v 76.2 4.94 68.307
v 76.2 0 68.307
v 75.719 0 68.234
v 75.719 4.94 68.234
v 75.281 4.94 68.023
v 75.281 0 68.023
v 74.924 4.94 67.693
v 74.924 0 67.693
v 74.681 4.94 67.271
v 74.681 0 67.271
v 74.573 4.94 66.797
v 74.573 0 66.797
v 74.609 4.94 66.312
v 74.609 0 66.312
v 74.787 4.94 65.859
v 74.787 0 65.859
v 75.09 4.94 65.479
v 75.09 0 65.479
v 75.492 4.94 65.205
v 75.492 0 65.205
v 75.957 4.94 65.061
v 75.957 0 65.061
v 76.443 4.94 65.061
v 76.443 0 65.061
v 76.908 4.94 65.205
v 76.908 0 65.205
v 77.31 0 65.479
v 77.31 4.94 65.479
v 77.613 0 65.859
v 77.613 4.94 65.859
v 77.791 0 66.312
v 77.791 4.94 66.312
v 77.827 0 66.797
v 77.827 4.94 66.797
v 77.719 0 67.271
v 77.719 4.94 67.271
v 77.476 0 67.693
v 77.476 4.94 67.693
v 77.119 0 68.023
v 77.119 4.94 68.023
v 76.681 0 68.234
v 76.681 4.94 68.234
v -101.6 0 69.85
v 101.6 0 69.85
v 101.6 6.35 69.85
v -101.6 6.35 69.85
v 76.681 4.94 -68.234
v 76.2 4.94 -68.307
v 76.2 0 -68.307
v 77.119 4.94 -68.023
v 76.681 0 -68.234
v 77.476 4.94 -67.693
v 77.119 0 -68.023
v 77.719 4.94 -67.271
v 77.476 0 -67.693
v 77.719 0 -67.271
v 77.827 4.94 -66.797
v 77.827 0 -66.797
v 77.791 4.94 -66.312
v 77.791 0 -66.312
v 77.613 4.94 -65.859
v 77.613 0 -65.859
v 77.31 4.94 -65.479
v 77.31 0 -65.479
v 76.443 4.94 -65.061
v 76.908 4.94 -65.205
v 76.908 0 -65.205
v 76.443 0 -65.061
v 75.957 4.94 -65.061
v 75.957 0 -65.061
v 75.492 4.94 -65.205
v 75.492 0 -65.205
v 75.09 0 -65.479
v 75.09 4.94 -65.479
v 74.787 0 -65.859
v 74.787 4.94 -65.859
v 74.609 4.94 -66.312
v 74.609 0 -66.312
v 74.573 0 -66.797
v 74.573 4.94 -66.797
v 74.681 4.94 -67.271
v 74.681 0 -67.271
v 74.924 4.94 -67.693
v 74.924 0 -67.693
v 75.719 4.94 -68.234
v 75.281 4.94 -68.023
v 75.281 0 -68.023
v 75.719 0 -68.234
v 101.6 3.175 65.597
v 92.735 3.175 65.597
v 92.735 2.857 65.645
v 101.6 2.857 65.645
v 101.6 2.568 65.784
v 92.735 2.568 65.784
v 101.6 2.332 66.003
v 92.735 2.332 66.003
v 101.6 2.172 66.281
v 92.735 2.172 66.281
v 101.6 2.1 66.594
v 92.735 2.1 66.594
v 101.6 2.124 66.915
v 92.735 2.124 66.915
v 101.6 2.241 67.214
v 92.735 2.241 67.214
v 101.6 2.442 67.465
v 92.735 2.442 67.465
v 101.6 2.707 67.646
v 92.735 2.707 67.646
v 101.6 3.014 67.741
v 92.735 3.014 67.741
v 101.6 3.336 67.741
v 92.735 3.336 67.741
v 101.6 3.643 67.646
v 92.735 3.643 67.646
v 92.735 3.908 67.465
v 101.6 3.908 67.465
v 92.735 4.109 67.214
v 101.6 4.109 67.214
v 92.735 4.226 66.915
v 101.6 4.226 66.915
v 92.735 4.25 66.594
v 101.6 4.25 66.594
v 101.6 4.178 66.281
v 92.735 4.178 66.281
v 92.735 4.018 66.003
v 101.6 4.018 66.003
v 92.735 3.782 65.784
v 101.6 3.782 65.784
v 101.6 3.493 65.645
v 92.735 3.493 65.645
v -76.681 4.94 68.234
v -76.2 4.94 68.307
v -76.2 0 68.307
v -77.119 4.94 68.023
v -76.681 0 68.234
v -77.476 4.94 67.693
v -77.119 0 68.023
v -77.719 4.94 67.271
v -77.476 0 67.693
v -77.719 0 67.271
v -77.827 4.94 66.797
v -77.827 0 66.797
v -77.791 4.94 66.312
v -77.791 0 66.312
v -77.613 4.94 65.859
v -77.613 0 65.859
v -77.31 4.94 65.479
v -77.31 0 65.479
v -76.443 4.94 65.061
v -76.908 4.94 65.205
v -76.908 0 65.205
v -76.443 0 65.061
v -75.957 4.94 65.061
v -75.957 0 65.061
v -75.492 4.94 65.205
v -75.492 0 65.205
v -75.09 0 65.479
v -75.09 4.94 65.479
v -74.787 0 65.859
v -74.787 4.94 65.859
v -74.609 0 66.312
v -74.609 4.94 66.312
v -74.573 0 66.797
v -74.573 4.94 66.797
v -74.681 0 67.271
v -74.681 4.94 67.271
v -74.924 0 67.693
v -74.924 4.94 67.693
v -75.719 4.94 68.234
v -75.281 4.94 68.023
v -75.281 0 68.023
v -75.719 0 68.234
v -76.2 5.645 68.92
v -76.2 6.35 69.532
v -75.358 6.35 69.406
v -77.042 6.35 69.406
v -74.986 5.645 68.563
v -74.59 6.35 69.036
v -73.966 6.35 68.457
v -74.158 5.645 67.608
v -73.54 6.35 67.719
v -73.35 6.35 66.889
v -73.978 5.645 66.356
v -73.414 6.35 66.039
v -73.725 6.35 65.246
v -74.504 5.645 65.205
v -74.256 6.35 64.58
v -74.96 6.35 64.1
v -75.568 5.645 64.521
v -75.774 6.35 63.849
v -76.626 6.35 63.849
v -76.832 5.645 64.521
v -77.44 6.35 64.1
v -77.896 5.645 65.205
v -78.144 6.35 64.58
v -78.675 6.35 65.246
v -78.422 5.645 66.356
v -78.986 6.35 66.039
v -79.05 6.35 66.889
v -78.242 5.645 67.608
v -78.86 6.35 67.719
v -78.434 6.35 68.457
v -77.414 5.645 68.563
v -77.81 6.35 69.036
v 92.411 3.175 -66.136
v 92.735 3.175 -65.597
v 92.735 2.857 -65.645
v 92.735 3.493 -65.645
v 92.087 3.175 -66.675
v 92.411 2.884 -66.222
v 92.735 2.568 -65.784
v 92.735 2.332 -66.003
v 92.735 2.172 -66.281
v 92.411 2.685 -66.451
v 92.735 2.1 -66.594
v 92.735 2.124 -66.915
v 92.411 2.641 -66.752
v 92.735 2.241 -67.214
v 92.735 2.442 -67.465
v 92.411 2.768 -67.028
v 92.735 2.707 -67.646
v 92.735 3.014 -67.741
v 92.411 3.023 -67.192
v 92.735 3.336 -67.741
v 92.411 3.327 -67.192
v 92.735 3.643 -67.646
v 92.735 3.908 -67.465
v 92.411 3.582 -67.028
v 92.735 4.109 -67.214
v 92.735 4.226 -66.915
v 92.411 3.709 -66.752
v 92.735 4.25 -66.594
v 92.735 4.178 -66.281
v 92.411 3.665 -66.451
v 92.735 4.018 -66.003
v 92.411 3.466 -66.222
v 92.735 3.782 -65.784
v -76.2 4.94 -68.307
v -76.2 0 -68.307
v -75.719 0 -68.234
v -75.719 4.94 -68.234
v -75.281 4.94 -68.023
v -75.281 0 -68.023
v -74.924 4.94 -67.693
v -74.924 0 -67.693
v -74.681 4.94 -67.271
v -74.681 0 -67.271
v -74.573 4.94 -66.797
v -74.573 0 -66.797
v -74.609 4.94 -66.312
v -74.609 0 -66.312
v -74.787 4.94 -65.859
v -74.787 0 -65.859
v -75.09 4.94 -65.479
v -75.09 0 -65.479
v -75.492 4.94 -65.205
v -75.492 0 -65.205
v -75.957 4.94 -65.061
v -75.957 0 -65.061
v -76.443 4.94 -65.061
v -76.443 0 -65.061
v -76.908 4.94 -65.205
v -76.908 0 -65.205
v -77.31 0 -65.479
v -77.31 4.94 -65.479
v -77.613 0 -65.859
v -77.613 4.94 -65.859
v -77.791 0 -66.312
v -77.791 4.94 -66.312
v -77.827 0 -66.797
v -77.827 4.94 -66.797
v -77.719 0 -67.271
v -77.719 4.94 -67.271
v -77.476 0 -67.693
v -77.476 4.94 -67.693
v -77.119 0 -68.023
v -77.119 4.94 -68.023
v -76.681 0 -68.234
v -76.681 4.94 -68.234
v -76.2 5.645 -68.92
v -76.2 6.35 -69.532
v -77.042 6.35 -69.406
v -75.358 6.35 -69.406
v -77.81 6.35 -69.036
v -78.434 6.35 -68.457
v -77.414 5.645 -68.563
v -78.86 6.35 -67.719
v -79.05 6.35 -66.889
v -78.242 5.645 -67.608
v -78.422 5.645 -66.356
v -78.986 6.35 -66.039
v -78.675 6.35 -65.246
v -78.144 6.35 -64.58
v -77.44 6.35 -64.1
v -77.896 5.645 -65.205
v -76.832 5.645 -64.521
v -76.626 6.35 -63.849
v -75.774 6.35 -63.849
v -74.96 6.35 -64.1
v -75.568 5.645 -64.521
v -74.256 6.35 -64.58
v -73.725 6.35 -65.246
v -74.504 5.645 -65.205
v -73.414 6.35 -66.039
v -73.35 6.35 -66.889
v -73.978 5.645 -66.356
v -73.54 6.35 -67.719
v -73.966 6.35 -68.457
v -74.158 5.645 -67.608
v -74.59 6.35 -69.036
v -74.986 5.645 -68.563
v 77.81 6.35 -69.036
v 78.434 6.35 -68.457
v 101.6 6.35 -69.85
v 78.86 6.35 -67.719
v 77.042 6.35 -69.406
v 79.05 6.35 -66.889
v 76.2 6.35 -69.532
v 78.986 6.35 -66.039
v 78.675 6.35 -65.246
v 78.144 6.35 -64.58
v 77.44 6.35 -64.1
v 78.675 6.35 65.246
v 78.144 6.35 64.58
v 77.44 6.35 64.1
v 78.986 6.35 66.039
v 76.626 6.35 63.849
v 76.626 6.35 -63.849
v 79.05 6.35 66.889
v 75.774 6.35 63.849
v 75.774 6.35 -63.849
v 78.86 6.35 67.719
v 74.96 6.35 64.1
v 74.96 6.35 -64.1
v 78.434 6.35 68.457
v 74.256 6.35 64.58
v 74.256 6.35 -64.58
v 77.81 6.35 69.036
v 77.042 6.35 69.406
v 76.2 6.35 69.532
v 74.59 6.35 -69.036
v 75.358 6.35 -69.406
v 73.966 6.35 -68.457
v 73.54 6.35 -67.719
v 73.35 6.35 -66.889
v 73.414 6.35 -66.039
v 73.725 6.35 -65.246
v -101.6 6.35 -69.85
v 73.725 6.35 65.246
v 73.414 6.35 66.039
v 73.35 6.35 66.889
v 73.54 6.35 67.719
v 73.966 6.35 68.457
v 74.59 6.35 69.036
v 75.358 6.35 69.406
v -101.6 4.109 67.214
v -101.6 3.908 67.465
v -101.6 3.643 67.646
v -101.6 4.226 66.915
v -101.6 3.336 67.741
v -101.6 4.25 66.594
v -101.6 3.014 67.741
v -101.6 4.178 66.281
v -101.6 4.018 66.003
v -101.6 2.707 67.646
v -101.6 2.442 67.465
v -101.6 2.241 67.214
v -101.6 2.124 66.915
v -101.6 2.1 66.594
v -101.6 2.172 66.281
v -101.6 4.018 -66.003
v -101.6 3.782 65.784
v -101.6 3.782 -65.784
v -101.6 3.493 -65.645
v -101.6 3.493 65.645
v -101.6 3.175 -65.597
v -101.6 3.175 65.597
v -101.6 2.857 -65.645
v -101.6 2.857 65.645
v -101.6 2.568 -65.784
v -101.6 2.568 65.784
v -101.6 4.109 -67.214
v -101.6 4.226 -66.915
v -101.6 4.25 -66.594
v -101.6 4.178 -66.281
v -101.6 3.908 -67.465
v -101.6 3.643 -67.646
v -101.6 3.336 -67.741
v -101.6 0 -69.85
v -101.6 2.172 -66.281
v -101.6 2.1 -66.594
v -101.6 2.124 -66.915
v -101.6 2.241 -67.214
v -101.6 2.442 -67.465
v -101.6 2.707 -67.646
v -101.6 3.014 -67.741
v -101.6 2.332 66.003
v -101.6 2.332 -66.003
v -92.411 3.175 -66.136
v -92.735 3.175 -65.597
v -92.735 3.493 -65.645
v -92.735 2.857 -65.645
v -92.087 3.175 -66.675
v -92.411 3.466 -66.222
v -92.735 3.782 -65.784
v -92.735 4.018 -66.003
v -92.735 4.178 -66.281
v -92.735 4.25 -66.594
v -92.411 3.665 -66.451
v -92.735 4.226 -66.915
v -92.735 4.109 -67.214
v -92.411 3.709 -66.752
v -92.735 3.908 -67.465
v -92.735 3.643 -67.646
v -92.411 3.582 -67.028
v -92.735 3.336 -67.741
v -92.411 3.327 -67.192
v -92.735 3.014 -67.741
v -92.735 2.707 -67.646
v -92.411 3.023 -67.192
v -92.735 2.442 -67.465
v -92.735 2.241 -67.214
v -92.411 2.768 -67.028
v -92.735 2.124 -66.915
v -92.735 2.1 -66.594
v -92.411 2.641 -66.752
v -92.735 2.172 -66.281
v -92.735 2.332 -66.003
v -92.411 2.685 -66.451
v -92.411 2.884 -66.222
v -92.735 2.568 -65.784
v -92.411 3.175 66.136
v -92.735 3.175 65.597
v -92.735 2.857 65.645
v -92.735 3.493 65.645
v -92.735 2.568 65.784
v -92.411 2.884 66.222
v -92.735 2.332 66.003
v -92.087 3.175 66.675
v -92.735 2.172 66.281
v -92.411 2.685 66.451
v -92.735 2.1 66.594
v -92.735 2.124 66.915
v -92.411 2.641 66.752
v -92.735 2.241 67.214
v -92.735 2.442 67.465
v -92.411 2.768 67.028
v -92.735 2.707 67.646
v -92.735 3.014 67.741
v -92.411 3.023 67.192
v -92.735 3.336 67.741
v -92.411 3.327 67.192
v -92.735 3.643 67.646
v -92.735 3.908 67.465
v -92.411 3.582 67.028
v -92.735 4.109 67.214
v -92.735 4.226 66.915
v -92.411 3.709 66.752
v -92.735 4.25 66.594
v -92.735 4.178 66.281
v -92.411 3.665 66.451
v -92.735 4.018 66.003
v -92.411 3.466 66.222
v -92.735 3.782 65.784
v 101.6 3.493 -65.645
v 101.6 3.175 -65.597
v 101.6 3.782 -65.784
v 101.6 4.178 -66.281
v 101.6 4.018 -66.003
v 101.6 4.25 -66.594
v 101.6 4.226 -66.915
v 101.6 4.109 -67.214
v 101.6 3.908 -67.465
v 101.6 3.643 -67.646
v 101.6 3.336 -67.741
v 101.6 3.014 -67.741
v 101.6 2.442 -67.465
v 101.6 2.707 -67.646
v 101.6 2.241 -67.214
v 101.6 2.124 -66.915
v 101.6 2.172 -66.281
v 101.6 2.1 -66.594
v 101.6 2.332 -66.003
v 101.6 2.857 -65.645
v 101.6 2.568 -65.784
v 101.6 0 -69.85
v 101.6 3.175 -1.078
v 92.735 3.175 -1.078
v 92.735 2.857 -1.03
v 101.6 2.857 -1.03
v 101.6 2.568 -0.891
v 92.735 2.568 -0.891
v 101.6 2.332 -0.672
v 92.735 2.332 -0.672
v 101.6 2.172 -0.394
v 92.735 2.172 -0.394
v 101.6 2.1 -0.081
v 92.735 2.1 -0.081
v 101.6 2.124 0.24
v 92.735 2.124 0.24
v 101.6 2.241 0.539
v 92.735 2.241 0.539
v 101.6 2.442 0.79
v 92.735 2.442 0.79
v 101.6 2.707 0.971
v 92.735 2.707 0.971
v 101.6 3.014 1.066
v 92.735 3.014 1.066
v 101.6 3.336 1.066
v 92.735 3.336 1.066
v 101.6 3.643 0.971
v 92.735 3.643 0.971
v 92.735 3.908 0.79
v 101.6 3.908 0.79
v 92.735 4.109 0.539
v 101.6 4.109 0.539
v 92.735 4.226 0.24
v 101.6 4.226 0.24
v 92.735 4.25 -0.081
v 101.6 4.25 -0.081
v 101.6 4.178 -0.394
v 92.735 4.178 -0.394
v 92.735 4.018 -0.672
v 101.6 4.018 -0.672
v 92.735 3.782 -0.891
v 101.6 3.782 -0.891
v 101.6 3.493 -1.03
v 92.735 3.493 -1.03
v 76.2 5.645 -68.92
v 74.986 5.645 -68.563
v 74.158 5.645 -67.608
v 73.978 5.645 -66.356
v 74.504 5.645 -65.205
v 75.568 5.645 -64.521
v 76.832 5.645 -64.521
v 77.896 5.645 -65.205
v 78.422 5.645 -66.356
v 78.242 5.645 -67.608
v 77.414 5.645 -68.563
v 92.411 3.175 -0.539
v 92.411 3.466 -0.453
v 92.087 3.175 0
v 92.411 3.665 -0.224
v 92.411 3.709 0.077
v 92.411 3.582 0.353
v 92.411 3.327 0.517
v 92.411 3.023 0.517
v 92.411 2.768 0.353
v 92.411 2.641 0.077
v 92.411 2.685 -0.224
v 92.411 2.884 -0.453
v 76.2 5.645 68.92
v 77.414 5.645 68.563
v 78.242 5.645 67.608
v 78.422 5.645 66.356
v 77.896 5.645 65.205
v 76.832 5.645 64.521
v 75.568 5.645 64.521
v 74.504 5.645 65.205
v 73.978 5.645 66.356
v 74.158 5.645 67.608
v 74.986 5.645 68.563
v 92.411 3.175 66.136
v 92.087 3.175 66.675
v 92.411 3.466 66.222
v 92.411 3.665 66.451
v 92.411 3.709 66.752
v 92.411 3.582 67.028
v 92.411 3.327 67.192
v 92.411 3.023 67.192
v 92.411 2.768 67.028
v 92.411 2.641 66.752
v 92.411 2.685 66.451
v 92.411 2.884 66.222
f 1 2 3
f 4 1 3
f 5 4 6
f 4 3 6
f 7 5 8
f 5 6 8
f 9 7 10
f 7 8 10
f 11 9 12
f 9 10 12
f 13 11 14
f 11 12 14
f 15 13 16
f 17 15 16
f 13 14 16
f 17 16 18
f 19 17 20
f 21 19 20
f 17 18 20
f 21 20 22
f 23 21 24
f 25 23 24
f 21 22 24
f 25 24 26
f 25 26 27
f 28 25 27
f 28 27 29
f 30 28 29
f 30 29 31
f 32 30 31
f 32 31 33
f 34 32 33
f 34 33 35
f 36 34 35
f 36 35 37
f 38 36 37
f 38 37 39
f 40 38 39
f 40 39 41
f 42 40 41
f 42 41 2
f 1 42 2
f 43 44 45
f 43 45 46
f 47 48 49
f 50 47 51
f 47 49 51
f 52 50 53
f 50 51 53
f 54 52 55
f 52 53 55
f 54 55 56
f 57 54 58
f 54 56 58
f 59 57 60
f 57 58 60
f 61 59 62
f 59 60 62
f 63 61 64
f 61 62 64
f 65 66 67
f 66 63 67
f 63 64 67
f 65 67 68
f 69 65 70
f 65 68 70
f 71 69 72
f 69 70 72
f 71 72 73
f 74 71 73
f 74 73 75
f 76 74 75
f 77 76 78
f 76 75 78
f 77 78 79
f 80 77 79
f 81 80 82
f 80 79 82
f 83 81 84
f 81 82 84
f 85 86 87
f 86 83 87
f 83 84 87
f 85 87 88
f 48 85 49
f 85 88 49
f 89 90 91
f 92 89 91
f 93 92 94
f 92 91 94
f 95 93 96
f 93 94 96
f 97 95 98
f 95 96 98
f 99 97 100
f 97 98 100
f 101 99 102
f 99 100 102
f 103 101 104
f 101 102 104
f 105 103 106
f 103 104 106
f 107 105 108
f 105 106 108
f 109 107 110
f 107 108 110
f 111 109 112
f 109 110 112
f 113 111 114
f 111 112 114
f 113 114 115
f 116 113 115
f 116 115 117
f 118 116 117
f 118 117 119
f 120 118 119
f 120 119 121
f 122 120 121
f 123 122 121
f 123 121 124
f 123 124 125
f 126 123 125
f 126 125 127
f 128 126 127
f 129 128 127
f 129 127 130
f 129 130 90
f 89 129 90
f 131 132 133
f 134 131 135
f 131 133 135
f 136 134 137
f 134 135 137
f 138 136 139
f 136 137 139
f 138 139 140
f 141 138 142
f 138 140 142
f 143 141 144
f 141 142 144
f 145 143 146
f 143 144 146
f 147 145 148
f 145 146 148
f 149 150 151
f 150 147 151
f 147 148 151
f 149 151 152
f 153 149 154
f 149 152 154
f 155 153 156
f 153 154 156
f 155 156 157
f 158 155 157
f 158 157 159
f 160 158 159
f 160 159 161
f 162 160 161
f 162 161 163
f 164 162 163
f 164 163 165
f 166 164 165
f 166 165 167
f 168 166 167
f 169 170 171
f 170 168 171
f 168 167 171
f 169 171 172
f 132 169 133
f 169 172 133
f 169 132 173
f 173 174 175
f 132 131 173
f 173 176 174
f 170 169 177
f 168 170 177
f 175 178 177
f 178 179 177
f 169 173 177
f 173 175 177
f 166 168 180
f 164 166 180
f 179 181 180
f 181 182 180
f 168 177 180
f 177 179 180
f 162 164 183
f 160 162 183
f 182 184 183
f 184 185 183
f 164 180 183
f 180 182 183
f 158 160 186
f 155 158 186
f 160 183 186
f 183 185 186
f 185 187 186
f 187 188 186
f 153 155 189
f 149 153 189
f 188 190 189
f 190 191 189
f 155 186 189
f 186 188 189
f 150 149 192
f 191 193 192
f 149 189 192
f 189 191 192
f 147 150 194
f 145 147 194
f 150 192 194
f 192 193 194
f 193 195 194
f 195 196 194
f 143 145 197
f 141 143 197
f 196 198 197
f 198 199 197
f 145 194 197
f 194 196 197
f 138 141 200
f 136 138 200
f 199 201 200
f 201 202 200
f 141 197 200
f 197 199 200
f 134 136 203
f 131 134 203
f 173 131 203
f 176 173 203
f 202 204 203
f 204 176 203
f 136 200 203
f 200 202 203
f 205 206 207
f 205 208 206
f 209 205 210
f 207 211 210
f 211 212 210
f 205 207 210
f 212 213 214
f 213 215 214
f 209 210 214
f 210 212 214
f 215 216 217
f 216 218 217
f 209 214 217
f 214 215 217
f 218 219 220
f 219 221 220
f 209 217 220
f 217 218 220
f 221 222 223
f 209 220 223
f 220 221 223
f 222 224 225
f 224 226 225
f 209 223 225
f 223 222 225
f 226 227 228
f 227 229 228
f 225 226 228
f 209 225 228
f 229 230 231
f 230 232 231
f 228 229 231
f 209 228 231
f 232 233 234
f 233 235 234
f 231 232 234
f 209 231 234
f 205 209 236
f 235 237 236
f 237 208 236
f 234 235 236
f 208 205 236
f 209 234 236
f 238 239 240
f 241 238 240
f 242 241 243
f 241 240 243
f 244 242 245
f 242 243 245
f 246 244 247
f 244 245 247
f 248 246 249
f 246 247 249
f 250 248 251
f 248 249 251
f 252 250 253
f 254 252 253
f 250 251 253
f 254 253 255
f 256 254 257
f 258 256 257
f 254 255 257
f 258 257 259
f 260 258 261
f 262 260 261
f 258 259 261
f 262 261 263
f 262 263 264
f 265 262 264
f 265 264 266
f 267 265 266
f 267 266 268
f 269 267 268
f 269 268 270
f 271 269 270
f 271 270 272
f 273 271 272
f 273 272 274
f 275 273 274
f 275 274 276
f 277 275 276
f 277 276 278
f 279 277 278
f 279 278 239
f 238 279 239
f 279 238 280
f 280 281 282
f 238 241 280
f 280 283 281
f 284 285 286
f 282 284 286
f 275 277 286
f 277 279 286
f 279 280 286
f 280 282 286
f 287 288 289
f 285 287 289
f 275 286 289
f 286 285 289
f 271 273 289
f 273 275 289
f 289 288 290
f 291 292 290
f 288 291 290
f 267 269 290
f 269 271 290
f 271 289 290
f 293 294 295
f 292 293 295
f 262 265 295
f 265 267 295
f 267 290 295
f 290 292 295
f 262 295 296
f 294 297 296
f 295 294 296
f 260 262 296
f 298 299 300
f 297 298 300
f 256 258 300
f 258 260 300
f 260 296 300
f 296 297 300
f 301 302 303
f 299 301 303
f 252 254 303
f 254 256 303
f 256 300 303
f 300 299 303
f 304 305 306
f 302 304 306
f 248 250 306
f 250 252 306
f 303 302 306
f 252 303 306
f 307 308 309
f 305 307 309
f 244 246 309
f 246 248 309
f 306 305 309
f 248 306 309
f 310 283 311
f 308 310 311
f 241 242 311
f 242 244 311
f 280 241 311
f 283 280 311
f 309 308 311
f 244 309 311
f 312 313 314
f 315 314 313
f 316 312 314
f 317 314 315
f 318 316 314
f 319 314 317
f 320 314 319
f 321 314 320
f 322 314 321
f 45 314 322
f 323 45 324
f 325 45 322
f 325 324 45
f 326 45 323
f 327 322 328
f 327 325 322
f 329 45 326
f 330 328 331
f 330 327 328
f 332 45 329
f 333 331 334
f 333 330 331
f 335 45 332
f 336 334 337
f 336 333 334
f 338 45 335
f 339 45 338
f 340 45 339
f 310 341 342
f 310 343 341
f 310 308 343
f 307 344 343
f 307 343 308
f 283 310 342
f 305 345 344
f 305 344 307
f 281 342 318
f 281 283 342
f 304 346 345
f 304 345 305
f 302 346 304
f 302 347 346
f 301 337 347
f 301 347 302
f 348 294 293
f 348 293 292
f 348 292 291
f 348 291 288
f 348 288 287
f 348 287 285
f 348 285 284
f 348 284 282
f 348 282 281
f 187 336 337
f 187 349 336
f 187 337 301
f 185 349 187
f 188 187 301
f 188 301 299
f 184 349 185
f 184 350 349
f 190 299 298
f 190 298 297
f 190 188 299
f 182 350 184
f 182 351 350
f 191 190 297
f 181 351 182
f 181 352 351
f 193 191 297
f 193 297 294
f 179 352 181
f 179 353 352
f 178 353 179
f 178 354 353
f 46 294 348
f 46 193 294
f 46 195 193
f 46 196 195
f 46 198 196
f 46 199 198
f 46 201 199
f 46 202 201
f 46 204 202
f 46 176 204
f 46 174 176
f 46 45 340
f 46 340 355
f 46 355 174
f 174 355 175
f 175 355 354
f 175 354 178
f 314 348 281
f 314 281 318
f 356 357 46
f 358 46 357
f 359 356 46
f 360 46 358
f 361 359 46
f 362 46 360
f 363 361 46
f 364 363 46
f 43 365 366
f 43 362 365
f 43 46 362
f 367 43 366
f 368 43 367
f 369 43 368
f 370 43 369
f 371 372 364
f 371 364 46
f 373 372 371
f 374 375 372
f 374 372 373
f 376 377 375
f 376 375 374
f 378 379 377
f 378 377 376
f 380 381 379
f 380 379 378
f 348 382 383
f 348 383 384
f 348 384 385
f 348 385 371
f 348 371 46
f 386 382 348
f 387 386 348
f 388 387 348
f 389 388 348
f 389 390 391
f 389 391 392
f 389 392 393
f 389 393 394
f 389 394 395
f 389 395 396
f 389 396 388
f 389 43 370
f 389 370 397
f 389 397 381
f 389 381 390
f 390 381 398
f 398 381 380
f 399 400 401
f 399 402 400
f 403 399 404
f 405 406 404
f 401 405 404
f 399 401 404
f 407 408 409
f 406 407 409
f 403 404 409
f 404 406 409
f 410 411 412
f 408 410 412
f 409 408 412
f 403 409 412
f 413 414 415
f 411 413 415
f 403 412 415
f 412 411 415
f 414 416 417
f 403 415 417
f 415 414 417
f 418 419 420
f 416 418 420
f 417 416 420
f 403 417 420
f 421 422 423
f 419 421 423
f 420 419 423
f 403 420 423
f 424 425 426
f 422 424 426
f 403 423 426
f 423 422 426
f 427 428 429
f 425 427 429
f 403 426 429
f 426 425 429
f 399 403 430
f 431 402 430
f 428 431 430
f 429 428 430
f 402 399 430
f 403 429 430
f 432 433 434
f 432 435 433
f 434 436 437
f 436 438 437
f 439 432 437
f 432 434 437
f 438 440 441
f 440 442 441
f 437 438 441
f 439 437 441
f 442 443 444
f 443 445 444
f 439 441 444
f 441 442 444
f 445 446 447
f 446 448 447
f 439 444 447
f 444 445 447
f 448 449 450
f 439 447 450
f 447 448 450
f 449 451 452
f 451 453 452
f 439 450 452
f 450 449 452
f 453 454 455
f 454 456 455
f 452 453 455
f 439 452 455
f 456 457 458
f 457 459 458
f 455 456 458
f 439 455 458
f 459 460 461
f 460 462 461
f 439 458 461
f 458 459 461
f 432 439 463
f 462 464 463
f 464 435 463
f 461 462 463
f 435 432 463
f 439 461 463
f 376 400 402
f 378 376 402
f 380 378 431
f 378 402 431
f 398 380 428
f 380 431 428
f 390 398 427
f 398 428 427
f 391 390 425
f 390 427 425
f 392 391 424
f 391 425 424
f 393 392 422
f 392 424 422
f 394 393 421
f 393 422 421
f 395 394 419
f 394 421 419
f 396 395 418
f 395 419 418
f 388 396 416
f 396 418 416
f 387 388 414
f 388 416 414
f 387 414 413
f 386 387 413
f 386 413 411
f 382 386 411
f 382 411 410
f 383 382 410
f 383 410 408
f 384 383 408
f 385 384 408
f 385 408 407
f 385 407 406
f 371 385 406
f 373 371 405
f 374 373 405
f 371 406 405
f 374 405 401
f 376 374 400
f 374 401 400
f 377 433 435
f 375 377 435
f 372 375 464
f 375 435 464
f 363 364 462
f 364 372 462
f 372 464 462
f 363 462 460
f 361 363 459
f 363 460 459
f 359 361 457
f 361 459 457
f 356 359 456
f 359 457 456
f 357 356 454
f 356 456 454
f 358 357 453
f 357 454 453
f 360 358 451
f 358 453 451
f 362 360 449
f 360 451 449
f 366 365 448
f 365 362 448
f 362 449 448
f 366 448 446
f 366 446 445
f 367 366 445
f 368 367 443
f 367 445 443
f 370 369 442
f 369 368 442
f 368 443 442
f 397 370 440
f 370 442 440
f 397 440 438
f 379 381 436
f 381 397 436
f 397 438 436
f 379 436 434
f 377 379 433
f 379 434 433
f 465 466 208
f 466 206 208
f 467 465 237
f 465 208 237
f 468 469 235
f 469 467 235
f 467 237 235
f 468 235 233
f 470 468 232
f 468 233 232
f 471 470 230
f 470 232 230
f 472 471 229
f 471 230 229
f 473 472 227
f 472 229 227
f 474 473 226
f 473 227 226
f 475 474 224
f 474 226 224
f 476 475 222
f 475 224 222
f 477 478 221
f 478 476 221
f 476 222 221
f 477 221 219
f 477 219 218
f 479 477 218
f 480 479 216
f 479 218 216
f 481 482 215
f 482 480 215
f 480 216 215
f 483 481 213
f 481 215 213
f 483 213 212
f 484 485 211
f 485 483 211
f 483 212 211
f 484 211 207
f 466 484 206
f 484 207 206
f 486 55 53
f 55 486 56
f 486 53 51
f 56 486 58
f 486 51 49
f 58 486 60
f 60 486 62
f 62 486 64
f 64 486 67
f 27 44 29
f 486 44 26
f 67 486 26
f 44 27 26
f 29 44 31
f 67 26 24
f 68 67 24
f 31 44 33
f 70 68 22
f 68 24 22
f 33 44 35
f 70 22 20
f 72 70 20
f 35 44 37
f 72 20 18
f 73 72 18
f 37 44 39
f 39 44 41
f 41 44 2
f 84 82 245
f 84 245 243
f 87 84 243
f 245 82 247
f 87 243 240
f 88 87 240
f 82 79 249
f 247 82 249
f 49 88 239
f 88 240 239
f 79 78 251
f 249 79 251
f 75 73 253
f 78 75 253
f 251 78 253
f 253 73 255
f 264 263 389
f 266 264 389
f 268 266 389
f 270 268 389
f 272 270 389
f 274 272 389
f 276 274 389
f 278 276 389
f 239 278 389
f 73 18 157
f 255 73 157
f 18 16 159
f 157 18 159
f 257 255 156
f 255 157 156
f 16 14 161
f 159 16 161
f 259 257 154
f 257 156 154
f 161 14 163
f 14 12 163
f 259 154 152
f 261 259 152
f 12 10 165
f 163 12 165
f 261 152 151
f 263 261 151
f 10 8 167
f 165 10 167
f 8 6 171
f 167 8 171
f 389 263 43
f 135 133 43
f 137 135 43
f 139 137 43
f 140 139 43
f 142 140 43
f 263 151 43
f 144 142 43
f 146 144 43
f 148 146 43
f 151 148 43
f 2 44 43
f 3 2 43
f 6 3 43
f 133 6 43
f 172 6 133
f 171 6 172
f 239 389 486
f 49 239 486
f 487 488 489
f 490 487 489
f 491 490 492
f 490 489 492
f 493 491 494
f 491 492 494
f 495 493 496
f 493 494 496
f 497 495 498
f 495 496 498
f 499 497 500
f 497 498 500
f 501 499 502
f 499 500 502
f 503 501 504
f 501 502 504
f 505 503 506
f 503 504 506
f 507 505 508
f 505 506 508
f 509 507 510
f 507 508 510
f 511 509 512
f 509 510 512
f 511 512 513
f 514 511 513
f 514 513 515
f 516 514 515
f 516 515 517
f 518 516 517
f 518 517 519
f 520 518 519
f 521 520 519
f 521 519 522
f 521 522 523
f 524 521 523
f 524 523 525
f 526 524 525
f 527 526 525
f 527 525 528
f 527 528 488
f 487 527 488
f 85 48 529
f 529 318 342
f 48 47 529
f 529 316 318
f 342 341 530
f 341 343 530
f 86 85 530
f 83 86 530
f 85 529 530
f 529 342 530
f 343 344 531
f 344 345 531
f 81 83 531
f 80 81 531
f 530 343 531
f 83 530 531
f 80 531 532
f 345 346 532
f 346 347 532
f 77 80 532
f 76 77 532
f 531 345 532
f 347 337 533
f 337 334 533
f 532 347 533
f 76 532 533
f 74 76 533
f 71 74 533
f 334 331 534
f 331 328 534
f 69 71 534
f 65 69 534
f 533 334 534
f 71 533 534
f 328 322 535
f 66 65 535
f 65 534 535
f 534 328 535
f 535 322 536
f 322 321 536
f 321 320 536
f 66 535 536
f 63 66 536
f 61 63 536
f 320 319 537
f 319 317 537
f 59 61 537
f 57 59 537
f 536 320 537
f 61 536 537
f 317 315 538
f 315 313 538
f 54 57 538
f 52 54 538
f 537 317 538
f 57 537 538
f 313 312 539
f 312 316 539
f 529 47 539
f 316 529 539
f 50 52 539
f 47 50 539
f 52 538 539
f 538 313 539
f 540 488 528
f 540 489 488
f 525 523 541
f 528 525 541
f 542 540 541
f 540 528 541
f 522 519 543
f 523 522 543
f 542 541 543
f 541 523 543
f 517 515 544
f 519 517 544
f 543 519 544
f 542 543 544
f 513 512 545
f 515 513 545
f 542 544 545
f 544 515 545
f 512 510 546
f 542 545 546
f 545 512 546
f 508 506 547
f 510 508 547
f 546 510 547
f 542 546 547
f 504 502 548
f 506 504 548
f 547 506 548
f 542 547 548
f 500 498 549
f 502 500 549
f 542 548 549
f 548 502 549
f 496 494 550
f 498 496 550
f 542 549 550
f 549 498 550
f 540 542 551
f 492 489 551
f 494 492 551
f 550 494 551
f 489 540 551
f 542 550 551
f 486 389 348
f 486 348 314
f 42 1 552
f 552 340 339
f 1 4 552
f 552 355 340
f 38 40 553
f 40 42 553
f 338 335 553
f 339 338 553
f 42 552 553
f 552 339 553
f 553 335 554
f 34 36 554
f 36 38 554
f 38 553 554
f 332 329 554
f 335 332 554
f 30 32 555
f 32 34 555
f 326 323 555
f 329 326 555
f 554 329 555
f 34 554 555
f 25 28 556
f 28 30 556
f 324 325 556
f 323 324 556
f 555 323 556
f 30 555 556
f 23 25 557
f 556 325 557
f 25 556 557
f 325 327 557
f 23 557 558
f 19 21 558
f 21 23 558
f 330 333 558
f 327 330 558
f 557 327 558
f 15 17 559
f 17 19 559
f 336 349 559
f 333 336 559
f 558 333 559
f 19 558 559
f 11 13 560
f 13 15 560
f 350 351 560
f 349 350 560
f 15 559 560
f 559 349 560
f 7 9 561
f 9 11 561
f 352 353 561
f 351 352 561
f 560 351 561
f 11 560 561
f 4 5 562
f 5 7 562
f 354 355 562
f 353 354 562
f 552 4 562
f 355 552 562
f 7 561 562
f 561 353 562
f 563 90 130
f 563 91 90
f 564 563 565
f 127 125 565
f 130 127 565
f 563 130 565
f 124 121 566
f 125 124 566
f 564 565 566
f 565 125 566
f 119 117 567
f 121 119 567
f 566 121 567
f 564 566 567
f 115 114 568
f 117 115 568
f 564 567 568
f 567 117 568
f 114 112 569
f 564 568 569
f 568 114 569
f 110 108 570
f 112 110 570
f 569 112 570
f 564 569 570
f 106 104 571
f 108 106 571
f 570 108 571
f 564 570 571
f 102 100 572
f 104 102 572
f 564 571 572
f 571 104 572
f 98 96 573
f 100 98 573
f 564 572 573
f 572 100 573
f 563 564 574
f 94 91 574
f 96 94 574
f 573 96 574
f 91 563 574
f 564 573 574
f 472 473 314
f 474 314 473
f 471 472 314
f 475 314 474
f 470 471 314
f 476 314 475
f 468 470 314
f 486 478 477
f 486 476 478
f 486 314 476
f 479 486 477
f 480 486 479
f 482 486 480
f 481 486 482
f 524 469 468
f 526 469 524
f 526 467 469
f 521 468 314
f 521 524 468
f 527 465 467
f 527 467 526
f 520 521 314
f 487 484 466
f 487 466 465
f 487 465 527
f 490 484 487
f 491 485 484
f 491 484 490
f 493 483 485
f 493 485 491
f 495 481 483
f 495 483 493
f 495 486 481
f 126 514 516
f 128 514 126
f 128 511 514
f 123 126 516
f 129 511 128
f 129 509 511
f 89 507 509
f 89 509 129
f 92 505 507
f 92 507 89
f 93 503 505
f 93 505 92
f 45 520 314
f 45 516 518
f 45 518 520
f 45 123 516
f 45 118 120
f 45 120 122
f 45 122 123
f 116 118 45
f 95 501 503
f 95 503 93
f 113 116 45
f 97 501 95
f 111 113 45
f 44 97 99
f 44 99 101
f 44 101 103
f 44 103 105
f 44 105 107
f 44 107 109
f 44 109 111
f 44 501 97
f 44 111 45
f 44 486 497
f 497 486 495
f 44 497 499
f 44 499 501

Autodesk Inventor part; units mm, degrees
ref_plane "YZ Plane" through (0, 0, 0) normal (1, 0, 0) x (0, 1, 0)
ref_plane "XZ Plane" through (0, 0, 0) normal (0, 1, 0) x (-1, 0, 0)
ref_plane "XY Plane" through (0, 0, 0) normal (0, 0, 1) x (1, 0, 0)
sketch "Sketch1" plane through (0, 0, 0) normal (0, 1, 0) x (-1, 0, 0)
  line L0 (-101.6, 69.85) -> (101.6, 69.85)
  line L1 (101.6, 69.85) -> (101.6, -69.85)
  line L2 (101.6, -69.85) -> (-101.6, -69.85)
  line L3 (-101.6, -69.85) -> (-101.6, 69.85)
  line L4 (-101.6, 69.85) -> (101.6, -69.85) construction
  line L5 (101.6, 69.85) -> (-101.6, -69.85) construction
  point P0 (0, 0)
  dimension "d0" = 203.2
  dimension "d1" = 139.7
extrude "Extrusion1" add sketch "Sketch1" along normal blind 6.35
sketch "Sketch9" plane through (101.6, 0, 69.85) normal (1, 0, 0) x (0, 0, -1)
  line L0 (139.7, 0) -> (0, 0) projected
  line L1 (139.7, 0) -> (139.7, 6.35) projected
  line L2 (0, 6.35) -> (139.7, 6.35) projected
  line L3 (0, 0) -> (0, 6.35) projected
  point P0 (69.85, 0)
  point P1 (3.175, 3.175)
  dimension "d45" = 3.175
  dimension "d46" = 3.175
hole "Hole3" at (101.6, 3.175, 66.675) direction (-1, 0, 0) diameter 2.156 depth 8.865 tip angle 118 thread size "4-40 UNC" class "2B" standard "ANSI Unified Screw Threads"
mirror "Mirror5" about plane through (0, 0, 0) normal (0, 0, 1) of "Hole3"
mirror "Mirror6" about plane through (0, 0, 0) normal (1, 0, 0) of "Hole3", "Mirror5"
sketch "Sketch11" plane through (0, 6.35, 0) normal (0, 1, 0) x (1, 0, 0)
  line L0 (-101.6, -69.85) -> (101.6, -69.85) projected
  line L1 (101.6, -69.85) -> (101.6, 69.85) projected
  line L2 (101.6, 69.85) -> (-101.6, 69.85) projected
  line L3 (-101.6, 69.85) -> (-101.6, -69.85) projected
  point P0 (0, 0)
  point P1 (76.2, -66.675)
  dimension "d61" = 25.4
  dimension "d62" = 3.175
hole "Hole4" at (76.2, 6.35, 66.675) direction (0, -1, 0) diameter 3.264 end through all countersink diameter 5.715 countersink angle 82 clearance for "Flat Head Machine Screw (82)" size "#4" standard "Ansi Unified Screw Threads"
mirror "Mirror7" about plane through (0, 0, 0) normal (1, 0, 0) of "Hole4"
mirror "Mirror8" about plane through (0, 0, 0) normal (0, 0, 1) of "Hole4", "Mirror7"
sketch "Sketch12" plane through (101.6, 0, 69.85) normal (1, 0, 0) x (0, 0, -1)
  circle A0 centre (136.525, 3.175) radius 1.078 projected
  circle A1 centre (3.175, 3.175) radius 1.078 projected
  line L0 (139.7, 0) -> (0, 0) projected
  line L1 (139.7, 0) -> (139.7, 6.35) projected
  line L2 (0, 6.35) -> (139.7, 6.35) projected
  line L3 (0, 0) -> (0, 6.35) projected
  point P0 (69.85, 0)
  point P1 (69.85, 3.175)
  dimension "d70" = 3.175
  dimension "d71" = 69.85
hole "Hole5" at (101.6, 3.175, 0) direction (-1, 0, 0) diameter 2.156 depth 8.865 tip angle 118 thread size "4-40 UNC" class "2B" standard "ANSI Unified Screw Threads"
equation "\"d0\" = depth"
equation "\"d1\" = height + 2 * plasticThickness"
equation "\"d2\" = caseThickness"
equation "\"d45\" = 0.5 * caseThickness"
equation "\"d46\" = 0.5 * caseThickness"
equation "\"d61\" = 4 * caseThickness"
equation "\"d62\" = 0.5 * caseThickness"
equation "\"d70\" = 0.5 * caseThickness"
equation "\"d71\" = 0.5 * height + caseThickness"
equation "\"acrylicThickness\" = 9.525"
equation "\"depth\" = 203.2"
equation "\"height\" = 127"
equation "\"fresnelThickness\" = 0.254"
equation "\"focalLength\" = 152.4"
equation "\"centerThickness\" = 1.27"
equation "\"sensorHolderDepth\" = 19.05"
equation "\"internalAcrylicThickness\" = 6.35"
equation "\"frameAcrylicThickness\" = 9.525"
equation "\"width\" = 127"
equation "\"mirrorAngle\" = 2.5deg"
equation "\"detectorWidth\" = 52"
equation "\"detectorHeight\" = 52"
equation "\"mirrorThickness\" = 3.175"
equation "\"ior\" = 1.49"
equation "\"fresnelAngle\" = 90deg"
equation "\"fresnelEffectiveDiameter\" = 152.4"
equation "\"oRingWidth\" = 1.5875"
equation "\"aerogelClearence\" = 3.175"
equation "\"backplanePCBHeight\" = 76.2"
equation "\"backplaneHoleOffsett\" = 6.35"
equation "\"backplanePCBWidth\" = 76.2"
equation "\"backplanePostionOffsett\" = 12.7"
equation "\"moduleSlotClearence\" = 0.79375"
equation "\"plasticThickness\" = 6.35"
equation "\"aerogelHolderDepth\" = 49.022"
equation "\"caseThickness\" = 6.35"
equation "\"alignmantGrooveDepth\" = 1.5875"
equation "\"alignmentGrooveDepth\" = 1.5875"
equation "\"alignmentGrooveClearance\" = 0.1016"
equation "\"frontPanelThickness\" = 1.5875"
equation "\"fresnelGrooveWidth\" = 1.778"
properties part number "sides" material "Aluminum 6061"
